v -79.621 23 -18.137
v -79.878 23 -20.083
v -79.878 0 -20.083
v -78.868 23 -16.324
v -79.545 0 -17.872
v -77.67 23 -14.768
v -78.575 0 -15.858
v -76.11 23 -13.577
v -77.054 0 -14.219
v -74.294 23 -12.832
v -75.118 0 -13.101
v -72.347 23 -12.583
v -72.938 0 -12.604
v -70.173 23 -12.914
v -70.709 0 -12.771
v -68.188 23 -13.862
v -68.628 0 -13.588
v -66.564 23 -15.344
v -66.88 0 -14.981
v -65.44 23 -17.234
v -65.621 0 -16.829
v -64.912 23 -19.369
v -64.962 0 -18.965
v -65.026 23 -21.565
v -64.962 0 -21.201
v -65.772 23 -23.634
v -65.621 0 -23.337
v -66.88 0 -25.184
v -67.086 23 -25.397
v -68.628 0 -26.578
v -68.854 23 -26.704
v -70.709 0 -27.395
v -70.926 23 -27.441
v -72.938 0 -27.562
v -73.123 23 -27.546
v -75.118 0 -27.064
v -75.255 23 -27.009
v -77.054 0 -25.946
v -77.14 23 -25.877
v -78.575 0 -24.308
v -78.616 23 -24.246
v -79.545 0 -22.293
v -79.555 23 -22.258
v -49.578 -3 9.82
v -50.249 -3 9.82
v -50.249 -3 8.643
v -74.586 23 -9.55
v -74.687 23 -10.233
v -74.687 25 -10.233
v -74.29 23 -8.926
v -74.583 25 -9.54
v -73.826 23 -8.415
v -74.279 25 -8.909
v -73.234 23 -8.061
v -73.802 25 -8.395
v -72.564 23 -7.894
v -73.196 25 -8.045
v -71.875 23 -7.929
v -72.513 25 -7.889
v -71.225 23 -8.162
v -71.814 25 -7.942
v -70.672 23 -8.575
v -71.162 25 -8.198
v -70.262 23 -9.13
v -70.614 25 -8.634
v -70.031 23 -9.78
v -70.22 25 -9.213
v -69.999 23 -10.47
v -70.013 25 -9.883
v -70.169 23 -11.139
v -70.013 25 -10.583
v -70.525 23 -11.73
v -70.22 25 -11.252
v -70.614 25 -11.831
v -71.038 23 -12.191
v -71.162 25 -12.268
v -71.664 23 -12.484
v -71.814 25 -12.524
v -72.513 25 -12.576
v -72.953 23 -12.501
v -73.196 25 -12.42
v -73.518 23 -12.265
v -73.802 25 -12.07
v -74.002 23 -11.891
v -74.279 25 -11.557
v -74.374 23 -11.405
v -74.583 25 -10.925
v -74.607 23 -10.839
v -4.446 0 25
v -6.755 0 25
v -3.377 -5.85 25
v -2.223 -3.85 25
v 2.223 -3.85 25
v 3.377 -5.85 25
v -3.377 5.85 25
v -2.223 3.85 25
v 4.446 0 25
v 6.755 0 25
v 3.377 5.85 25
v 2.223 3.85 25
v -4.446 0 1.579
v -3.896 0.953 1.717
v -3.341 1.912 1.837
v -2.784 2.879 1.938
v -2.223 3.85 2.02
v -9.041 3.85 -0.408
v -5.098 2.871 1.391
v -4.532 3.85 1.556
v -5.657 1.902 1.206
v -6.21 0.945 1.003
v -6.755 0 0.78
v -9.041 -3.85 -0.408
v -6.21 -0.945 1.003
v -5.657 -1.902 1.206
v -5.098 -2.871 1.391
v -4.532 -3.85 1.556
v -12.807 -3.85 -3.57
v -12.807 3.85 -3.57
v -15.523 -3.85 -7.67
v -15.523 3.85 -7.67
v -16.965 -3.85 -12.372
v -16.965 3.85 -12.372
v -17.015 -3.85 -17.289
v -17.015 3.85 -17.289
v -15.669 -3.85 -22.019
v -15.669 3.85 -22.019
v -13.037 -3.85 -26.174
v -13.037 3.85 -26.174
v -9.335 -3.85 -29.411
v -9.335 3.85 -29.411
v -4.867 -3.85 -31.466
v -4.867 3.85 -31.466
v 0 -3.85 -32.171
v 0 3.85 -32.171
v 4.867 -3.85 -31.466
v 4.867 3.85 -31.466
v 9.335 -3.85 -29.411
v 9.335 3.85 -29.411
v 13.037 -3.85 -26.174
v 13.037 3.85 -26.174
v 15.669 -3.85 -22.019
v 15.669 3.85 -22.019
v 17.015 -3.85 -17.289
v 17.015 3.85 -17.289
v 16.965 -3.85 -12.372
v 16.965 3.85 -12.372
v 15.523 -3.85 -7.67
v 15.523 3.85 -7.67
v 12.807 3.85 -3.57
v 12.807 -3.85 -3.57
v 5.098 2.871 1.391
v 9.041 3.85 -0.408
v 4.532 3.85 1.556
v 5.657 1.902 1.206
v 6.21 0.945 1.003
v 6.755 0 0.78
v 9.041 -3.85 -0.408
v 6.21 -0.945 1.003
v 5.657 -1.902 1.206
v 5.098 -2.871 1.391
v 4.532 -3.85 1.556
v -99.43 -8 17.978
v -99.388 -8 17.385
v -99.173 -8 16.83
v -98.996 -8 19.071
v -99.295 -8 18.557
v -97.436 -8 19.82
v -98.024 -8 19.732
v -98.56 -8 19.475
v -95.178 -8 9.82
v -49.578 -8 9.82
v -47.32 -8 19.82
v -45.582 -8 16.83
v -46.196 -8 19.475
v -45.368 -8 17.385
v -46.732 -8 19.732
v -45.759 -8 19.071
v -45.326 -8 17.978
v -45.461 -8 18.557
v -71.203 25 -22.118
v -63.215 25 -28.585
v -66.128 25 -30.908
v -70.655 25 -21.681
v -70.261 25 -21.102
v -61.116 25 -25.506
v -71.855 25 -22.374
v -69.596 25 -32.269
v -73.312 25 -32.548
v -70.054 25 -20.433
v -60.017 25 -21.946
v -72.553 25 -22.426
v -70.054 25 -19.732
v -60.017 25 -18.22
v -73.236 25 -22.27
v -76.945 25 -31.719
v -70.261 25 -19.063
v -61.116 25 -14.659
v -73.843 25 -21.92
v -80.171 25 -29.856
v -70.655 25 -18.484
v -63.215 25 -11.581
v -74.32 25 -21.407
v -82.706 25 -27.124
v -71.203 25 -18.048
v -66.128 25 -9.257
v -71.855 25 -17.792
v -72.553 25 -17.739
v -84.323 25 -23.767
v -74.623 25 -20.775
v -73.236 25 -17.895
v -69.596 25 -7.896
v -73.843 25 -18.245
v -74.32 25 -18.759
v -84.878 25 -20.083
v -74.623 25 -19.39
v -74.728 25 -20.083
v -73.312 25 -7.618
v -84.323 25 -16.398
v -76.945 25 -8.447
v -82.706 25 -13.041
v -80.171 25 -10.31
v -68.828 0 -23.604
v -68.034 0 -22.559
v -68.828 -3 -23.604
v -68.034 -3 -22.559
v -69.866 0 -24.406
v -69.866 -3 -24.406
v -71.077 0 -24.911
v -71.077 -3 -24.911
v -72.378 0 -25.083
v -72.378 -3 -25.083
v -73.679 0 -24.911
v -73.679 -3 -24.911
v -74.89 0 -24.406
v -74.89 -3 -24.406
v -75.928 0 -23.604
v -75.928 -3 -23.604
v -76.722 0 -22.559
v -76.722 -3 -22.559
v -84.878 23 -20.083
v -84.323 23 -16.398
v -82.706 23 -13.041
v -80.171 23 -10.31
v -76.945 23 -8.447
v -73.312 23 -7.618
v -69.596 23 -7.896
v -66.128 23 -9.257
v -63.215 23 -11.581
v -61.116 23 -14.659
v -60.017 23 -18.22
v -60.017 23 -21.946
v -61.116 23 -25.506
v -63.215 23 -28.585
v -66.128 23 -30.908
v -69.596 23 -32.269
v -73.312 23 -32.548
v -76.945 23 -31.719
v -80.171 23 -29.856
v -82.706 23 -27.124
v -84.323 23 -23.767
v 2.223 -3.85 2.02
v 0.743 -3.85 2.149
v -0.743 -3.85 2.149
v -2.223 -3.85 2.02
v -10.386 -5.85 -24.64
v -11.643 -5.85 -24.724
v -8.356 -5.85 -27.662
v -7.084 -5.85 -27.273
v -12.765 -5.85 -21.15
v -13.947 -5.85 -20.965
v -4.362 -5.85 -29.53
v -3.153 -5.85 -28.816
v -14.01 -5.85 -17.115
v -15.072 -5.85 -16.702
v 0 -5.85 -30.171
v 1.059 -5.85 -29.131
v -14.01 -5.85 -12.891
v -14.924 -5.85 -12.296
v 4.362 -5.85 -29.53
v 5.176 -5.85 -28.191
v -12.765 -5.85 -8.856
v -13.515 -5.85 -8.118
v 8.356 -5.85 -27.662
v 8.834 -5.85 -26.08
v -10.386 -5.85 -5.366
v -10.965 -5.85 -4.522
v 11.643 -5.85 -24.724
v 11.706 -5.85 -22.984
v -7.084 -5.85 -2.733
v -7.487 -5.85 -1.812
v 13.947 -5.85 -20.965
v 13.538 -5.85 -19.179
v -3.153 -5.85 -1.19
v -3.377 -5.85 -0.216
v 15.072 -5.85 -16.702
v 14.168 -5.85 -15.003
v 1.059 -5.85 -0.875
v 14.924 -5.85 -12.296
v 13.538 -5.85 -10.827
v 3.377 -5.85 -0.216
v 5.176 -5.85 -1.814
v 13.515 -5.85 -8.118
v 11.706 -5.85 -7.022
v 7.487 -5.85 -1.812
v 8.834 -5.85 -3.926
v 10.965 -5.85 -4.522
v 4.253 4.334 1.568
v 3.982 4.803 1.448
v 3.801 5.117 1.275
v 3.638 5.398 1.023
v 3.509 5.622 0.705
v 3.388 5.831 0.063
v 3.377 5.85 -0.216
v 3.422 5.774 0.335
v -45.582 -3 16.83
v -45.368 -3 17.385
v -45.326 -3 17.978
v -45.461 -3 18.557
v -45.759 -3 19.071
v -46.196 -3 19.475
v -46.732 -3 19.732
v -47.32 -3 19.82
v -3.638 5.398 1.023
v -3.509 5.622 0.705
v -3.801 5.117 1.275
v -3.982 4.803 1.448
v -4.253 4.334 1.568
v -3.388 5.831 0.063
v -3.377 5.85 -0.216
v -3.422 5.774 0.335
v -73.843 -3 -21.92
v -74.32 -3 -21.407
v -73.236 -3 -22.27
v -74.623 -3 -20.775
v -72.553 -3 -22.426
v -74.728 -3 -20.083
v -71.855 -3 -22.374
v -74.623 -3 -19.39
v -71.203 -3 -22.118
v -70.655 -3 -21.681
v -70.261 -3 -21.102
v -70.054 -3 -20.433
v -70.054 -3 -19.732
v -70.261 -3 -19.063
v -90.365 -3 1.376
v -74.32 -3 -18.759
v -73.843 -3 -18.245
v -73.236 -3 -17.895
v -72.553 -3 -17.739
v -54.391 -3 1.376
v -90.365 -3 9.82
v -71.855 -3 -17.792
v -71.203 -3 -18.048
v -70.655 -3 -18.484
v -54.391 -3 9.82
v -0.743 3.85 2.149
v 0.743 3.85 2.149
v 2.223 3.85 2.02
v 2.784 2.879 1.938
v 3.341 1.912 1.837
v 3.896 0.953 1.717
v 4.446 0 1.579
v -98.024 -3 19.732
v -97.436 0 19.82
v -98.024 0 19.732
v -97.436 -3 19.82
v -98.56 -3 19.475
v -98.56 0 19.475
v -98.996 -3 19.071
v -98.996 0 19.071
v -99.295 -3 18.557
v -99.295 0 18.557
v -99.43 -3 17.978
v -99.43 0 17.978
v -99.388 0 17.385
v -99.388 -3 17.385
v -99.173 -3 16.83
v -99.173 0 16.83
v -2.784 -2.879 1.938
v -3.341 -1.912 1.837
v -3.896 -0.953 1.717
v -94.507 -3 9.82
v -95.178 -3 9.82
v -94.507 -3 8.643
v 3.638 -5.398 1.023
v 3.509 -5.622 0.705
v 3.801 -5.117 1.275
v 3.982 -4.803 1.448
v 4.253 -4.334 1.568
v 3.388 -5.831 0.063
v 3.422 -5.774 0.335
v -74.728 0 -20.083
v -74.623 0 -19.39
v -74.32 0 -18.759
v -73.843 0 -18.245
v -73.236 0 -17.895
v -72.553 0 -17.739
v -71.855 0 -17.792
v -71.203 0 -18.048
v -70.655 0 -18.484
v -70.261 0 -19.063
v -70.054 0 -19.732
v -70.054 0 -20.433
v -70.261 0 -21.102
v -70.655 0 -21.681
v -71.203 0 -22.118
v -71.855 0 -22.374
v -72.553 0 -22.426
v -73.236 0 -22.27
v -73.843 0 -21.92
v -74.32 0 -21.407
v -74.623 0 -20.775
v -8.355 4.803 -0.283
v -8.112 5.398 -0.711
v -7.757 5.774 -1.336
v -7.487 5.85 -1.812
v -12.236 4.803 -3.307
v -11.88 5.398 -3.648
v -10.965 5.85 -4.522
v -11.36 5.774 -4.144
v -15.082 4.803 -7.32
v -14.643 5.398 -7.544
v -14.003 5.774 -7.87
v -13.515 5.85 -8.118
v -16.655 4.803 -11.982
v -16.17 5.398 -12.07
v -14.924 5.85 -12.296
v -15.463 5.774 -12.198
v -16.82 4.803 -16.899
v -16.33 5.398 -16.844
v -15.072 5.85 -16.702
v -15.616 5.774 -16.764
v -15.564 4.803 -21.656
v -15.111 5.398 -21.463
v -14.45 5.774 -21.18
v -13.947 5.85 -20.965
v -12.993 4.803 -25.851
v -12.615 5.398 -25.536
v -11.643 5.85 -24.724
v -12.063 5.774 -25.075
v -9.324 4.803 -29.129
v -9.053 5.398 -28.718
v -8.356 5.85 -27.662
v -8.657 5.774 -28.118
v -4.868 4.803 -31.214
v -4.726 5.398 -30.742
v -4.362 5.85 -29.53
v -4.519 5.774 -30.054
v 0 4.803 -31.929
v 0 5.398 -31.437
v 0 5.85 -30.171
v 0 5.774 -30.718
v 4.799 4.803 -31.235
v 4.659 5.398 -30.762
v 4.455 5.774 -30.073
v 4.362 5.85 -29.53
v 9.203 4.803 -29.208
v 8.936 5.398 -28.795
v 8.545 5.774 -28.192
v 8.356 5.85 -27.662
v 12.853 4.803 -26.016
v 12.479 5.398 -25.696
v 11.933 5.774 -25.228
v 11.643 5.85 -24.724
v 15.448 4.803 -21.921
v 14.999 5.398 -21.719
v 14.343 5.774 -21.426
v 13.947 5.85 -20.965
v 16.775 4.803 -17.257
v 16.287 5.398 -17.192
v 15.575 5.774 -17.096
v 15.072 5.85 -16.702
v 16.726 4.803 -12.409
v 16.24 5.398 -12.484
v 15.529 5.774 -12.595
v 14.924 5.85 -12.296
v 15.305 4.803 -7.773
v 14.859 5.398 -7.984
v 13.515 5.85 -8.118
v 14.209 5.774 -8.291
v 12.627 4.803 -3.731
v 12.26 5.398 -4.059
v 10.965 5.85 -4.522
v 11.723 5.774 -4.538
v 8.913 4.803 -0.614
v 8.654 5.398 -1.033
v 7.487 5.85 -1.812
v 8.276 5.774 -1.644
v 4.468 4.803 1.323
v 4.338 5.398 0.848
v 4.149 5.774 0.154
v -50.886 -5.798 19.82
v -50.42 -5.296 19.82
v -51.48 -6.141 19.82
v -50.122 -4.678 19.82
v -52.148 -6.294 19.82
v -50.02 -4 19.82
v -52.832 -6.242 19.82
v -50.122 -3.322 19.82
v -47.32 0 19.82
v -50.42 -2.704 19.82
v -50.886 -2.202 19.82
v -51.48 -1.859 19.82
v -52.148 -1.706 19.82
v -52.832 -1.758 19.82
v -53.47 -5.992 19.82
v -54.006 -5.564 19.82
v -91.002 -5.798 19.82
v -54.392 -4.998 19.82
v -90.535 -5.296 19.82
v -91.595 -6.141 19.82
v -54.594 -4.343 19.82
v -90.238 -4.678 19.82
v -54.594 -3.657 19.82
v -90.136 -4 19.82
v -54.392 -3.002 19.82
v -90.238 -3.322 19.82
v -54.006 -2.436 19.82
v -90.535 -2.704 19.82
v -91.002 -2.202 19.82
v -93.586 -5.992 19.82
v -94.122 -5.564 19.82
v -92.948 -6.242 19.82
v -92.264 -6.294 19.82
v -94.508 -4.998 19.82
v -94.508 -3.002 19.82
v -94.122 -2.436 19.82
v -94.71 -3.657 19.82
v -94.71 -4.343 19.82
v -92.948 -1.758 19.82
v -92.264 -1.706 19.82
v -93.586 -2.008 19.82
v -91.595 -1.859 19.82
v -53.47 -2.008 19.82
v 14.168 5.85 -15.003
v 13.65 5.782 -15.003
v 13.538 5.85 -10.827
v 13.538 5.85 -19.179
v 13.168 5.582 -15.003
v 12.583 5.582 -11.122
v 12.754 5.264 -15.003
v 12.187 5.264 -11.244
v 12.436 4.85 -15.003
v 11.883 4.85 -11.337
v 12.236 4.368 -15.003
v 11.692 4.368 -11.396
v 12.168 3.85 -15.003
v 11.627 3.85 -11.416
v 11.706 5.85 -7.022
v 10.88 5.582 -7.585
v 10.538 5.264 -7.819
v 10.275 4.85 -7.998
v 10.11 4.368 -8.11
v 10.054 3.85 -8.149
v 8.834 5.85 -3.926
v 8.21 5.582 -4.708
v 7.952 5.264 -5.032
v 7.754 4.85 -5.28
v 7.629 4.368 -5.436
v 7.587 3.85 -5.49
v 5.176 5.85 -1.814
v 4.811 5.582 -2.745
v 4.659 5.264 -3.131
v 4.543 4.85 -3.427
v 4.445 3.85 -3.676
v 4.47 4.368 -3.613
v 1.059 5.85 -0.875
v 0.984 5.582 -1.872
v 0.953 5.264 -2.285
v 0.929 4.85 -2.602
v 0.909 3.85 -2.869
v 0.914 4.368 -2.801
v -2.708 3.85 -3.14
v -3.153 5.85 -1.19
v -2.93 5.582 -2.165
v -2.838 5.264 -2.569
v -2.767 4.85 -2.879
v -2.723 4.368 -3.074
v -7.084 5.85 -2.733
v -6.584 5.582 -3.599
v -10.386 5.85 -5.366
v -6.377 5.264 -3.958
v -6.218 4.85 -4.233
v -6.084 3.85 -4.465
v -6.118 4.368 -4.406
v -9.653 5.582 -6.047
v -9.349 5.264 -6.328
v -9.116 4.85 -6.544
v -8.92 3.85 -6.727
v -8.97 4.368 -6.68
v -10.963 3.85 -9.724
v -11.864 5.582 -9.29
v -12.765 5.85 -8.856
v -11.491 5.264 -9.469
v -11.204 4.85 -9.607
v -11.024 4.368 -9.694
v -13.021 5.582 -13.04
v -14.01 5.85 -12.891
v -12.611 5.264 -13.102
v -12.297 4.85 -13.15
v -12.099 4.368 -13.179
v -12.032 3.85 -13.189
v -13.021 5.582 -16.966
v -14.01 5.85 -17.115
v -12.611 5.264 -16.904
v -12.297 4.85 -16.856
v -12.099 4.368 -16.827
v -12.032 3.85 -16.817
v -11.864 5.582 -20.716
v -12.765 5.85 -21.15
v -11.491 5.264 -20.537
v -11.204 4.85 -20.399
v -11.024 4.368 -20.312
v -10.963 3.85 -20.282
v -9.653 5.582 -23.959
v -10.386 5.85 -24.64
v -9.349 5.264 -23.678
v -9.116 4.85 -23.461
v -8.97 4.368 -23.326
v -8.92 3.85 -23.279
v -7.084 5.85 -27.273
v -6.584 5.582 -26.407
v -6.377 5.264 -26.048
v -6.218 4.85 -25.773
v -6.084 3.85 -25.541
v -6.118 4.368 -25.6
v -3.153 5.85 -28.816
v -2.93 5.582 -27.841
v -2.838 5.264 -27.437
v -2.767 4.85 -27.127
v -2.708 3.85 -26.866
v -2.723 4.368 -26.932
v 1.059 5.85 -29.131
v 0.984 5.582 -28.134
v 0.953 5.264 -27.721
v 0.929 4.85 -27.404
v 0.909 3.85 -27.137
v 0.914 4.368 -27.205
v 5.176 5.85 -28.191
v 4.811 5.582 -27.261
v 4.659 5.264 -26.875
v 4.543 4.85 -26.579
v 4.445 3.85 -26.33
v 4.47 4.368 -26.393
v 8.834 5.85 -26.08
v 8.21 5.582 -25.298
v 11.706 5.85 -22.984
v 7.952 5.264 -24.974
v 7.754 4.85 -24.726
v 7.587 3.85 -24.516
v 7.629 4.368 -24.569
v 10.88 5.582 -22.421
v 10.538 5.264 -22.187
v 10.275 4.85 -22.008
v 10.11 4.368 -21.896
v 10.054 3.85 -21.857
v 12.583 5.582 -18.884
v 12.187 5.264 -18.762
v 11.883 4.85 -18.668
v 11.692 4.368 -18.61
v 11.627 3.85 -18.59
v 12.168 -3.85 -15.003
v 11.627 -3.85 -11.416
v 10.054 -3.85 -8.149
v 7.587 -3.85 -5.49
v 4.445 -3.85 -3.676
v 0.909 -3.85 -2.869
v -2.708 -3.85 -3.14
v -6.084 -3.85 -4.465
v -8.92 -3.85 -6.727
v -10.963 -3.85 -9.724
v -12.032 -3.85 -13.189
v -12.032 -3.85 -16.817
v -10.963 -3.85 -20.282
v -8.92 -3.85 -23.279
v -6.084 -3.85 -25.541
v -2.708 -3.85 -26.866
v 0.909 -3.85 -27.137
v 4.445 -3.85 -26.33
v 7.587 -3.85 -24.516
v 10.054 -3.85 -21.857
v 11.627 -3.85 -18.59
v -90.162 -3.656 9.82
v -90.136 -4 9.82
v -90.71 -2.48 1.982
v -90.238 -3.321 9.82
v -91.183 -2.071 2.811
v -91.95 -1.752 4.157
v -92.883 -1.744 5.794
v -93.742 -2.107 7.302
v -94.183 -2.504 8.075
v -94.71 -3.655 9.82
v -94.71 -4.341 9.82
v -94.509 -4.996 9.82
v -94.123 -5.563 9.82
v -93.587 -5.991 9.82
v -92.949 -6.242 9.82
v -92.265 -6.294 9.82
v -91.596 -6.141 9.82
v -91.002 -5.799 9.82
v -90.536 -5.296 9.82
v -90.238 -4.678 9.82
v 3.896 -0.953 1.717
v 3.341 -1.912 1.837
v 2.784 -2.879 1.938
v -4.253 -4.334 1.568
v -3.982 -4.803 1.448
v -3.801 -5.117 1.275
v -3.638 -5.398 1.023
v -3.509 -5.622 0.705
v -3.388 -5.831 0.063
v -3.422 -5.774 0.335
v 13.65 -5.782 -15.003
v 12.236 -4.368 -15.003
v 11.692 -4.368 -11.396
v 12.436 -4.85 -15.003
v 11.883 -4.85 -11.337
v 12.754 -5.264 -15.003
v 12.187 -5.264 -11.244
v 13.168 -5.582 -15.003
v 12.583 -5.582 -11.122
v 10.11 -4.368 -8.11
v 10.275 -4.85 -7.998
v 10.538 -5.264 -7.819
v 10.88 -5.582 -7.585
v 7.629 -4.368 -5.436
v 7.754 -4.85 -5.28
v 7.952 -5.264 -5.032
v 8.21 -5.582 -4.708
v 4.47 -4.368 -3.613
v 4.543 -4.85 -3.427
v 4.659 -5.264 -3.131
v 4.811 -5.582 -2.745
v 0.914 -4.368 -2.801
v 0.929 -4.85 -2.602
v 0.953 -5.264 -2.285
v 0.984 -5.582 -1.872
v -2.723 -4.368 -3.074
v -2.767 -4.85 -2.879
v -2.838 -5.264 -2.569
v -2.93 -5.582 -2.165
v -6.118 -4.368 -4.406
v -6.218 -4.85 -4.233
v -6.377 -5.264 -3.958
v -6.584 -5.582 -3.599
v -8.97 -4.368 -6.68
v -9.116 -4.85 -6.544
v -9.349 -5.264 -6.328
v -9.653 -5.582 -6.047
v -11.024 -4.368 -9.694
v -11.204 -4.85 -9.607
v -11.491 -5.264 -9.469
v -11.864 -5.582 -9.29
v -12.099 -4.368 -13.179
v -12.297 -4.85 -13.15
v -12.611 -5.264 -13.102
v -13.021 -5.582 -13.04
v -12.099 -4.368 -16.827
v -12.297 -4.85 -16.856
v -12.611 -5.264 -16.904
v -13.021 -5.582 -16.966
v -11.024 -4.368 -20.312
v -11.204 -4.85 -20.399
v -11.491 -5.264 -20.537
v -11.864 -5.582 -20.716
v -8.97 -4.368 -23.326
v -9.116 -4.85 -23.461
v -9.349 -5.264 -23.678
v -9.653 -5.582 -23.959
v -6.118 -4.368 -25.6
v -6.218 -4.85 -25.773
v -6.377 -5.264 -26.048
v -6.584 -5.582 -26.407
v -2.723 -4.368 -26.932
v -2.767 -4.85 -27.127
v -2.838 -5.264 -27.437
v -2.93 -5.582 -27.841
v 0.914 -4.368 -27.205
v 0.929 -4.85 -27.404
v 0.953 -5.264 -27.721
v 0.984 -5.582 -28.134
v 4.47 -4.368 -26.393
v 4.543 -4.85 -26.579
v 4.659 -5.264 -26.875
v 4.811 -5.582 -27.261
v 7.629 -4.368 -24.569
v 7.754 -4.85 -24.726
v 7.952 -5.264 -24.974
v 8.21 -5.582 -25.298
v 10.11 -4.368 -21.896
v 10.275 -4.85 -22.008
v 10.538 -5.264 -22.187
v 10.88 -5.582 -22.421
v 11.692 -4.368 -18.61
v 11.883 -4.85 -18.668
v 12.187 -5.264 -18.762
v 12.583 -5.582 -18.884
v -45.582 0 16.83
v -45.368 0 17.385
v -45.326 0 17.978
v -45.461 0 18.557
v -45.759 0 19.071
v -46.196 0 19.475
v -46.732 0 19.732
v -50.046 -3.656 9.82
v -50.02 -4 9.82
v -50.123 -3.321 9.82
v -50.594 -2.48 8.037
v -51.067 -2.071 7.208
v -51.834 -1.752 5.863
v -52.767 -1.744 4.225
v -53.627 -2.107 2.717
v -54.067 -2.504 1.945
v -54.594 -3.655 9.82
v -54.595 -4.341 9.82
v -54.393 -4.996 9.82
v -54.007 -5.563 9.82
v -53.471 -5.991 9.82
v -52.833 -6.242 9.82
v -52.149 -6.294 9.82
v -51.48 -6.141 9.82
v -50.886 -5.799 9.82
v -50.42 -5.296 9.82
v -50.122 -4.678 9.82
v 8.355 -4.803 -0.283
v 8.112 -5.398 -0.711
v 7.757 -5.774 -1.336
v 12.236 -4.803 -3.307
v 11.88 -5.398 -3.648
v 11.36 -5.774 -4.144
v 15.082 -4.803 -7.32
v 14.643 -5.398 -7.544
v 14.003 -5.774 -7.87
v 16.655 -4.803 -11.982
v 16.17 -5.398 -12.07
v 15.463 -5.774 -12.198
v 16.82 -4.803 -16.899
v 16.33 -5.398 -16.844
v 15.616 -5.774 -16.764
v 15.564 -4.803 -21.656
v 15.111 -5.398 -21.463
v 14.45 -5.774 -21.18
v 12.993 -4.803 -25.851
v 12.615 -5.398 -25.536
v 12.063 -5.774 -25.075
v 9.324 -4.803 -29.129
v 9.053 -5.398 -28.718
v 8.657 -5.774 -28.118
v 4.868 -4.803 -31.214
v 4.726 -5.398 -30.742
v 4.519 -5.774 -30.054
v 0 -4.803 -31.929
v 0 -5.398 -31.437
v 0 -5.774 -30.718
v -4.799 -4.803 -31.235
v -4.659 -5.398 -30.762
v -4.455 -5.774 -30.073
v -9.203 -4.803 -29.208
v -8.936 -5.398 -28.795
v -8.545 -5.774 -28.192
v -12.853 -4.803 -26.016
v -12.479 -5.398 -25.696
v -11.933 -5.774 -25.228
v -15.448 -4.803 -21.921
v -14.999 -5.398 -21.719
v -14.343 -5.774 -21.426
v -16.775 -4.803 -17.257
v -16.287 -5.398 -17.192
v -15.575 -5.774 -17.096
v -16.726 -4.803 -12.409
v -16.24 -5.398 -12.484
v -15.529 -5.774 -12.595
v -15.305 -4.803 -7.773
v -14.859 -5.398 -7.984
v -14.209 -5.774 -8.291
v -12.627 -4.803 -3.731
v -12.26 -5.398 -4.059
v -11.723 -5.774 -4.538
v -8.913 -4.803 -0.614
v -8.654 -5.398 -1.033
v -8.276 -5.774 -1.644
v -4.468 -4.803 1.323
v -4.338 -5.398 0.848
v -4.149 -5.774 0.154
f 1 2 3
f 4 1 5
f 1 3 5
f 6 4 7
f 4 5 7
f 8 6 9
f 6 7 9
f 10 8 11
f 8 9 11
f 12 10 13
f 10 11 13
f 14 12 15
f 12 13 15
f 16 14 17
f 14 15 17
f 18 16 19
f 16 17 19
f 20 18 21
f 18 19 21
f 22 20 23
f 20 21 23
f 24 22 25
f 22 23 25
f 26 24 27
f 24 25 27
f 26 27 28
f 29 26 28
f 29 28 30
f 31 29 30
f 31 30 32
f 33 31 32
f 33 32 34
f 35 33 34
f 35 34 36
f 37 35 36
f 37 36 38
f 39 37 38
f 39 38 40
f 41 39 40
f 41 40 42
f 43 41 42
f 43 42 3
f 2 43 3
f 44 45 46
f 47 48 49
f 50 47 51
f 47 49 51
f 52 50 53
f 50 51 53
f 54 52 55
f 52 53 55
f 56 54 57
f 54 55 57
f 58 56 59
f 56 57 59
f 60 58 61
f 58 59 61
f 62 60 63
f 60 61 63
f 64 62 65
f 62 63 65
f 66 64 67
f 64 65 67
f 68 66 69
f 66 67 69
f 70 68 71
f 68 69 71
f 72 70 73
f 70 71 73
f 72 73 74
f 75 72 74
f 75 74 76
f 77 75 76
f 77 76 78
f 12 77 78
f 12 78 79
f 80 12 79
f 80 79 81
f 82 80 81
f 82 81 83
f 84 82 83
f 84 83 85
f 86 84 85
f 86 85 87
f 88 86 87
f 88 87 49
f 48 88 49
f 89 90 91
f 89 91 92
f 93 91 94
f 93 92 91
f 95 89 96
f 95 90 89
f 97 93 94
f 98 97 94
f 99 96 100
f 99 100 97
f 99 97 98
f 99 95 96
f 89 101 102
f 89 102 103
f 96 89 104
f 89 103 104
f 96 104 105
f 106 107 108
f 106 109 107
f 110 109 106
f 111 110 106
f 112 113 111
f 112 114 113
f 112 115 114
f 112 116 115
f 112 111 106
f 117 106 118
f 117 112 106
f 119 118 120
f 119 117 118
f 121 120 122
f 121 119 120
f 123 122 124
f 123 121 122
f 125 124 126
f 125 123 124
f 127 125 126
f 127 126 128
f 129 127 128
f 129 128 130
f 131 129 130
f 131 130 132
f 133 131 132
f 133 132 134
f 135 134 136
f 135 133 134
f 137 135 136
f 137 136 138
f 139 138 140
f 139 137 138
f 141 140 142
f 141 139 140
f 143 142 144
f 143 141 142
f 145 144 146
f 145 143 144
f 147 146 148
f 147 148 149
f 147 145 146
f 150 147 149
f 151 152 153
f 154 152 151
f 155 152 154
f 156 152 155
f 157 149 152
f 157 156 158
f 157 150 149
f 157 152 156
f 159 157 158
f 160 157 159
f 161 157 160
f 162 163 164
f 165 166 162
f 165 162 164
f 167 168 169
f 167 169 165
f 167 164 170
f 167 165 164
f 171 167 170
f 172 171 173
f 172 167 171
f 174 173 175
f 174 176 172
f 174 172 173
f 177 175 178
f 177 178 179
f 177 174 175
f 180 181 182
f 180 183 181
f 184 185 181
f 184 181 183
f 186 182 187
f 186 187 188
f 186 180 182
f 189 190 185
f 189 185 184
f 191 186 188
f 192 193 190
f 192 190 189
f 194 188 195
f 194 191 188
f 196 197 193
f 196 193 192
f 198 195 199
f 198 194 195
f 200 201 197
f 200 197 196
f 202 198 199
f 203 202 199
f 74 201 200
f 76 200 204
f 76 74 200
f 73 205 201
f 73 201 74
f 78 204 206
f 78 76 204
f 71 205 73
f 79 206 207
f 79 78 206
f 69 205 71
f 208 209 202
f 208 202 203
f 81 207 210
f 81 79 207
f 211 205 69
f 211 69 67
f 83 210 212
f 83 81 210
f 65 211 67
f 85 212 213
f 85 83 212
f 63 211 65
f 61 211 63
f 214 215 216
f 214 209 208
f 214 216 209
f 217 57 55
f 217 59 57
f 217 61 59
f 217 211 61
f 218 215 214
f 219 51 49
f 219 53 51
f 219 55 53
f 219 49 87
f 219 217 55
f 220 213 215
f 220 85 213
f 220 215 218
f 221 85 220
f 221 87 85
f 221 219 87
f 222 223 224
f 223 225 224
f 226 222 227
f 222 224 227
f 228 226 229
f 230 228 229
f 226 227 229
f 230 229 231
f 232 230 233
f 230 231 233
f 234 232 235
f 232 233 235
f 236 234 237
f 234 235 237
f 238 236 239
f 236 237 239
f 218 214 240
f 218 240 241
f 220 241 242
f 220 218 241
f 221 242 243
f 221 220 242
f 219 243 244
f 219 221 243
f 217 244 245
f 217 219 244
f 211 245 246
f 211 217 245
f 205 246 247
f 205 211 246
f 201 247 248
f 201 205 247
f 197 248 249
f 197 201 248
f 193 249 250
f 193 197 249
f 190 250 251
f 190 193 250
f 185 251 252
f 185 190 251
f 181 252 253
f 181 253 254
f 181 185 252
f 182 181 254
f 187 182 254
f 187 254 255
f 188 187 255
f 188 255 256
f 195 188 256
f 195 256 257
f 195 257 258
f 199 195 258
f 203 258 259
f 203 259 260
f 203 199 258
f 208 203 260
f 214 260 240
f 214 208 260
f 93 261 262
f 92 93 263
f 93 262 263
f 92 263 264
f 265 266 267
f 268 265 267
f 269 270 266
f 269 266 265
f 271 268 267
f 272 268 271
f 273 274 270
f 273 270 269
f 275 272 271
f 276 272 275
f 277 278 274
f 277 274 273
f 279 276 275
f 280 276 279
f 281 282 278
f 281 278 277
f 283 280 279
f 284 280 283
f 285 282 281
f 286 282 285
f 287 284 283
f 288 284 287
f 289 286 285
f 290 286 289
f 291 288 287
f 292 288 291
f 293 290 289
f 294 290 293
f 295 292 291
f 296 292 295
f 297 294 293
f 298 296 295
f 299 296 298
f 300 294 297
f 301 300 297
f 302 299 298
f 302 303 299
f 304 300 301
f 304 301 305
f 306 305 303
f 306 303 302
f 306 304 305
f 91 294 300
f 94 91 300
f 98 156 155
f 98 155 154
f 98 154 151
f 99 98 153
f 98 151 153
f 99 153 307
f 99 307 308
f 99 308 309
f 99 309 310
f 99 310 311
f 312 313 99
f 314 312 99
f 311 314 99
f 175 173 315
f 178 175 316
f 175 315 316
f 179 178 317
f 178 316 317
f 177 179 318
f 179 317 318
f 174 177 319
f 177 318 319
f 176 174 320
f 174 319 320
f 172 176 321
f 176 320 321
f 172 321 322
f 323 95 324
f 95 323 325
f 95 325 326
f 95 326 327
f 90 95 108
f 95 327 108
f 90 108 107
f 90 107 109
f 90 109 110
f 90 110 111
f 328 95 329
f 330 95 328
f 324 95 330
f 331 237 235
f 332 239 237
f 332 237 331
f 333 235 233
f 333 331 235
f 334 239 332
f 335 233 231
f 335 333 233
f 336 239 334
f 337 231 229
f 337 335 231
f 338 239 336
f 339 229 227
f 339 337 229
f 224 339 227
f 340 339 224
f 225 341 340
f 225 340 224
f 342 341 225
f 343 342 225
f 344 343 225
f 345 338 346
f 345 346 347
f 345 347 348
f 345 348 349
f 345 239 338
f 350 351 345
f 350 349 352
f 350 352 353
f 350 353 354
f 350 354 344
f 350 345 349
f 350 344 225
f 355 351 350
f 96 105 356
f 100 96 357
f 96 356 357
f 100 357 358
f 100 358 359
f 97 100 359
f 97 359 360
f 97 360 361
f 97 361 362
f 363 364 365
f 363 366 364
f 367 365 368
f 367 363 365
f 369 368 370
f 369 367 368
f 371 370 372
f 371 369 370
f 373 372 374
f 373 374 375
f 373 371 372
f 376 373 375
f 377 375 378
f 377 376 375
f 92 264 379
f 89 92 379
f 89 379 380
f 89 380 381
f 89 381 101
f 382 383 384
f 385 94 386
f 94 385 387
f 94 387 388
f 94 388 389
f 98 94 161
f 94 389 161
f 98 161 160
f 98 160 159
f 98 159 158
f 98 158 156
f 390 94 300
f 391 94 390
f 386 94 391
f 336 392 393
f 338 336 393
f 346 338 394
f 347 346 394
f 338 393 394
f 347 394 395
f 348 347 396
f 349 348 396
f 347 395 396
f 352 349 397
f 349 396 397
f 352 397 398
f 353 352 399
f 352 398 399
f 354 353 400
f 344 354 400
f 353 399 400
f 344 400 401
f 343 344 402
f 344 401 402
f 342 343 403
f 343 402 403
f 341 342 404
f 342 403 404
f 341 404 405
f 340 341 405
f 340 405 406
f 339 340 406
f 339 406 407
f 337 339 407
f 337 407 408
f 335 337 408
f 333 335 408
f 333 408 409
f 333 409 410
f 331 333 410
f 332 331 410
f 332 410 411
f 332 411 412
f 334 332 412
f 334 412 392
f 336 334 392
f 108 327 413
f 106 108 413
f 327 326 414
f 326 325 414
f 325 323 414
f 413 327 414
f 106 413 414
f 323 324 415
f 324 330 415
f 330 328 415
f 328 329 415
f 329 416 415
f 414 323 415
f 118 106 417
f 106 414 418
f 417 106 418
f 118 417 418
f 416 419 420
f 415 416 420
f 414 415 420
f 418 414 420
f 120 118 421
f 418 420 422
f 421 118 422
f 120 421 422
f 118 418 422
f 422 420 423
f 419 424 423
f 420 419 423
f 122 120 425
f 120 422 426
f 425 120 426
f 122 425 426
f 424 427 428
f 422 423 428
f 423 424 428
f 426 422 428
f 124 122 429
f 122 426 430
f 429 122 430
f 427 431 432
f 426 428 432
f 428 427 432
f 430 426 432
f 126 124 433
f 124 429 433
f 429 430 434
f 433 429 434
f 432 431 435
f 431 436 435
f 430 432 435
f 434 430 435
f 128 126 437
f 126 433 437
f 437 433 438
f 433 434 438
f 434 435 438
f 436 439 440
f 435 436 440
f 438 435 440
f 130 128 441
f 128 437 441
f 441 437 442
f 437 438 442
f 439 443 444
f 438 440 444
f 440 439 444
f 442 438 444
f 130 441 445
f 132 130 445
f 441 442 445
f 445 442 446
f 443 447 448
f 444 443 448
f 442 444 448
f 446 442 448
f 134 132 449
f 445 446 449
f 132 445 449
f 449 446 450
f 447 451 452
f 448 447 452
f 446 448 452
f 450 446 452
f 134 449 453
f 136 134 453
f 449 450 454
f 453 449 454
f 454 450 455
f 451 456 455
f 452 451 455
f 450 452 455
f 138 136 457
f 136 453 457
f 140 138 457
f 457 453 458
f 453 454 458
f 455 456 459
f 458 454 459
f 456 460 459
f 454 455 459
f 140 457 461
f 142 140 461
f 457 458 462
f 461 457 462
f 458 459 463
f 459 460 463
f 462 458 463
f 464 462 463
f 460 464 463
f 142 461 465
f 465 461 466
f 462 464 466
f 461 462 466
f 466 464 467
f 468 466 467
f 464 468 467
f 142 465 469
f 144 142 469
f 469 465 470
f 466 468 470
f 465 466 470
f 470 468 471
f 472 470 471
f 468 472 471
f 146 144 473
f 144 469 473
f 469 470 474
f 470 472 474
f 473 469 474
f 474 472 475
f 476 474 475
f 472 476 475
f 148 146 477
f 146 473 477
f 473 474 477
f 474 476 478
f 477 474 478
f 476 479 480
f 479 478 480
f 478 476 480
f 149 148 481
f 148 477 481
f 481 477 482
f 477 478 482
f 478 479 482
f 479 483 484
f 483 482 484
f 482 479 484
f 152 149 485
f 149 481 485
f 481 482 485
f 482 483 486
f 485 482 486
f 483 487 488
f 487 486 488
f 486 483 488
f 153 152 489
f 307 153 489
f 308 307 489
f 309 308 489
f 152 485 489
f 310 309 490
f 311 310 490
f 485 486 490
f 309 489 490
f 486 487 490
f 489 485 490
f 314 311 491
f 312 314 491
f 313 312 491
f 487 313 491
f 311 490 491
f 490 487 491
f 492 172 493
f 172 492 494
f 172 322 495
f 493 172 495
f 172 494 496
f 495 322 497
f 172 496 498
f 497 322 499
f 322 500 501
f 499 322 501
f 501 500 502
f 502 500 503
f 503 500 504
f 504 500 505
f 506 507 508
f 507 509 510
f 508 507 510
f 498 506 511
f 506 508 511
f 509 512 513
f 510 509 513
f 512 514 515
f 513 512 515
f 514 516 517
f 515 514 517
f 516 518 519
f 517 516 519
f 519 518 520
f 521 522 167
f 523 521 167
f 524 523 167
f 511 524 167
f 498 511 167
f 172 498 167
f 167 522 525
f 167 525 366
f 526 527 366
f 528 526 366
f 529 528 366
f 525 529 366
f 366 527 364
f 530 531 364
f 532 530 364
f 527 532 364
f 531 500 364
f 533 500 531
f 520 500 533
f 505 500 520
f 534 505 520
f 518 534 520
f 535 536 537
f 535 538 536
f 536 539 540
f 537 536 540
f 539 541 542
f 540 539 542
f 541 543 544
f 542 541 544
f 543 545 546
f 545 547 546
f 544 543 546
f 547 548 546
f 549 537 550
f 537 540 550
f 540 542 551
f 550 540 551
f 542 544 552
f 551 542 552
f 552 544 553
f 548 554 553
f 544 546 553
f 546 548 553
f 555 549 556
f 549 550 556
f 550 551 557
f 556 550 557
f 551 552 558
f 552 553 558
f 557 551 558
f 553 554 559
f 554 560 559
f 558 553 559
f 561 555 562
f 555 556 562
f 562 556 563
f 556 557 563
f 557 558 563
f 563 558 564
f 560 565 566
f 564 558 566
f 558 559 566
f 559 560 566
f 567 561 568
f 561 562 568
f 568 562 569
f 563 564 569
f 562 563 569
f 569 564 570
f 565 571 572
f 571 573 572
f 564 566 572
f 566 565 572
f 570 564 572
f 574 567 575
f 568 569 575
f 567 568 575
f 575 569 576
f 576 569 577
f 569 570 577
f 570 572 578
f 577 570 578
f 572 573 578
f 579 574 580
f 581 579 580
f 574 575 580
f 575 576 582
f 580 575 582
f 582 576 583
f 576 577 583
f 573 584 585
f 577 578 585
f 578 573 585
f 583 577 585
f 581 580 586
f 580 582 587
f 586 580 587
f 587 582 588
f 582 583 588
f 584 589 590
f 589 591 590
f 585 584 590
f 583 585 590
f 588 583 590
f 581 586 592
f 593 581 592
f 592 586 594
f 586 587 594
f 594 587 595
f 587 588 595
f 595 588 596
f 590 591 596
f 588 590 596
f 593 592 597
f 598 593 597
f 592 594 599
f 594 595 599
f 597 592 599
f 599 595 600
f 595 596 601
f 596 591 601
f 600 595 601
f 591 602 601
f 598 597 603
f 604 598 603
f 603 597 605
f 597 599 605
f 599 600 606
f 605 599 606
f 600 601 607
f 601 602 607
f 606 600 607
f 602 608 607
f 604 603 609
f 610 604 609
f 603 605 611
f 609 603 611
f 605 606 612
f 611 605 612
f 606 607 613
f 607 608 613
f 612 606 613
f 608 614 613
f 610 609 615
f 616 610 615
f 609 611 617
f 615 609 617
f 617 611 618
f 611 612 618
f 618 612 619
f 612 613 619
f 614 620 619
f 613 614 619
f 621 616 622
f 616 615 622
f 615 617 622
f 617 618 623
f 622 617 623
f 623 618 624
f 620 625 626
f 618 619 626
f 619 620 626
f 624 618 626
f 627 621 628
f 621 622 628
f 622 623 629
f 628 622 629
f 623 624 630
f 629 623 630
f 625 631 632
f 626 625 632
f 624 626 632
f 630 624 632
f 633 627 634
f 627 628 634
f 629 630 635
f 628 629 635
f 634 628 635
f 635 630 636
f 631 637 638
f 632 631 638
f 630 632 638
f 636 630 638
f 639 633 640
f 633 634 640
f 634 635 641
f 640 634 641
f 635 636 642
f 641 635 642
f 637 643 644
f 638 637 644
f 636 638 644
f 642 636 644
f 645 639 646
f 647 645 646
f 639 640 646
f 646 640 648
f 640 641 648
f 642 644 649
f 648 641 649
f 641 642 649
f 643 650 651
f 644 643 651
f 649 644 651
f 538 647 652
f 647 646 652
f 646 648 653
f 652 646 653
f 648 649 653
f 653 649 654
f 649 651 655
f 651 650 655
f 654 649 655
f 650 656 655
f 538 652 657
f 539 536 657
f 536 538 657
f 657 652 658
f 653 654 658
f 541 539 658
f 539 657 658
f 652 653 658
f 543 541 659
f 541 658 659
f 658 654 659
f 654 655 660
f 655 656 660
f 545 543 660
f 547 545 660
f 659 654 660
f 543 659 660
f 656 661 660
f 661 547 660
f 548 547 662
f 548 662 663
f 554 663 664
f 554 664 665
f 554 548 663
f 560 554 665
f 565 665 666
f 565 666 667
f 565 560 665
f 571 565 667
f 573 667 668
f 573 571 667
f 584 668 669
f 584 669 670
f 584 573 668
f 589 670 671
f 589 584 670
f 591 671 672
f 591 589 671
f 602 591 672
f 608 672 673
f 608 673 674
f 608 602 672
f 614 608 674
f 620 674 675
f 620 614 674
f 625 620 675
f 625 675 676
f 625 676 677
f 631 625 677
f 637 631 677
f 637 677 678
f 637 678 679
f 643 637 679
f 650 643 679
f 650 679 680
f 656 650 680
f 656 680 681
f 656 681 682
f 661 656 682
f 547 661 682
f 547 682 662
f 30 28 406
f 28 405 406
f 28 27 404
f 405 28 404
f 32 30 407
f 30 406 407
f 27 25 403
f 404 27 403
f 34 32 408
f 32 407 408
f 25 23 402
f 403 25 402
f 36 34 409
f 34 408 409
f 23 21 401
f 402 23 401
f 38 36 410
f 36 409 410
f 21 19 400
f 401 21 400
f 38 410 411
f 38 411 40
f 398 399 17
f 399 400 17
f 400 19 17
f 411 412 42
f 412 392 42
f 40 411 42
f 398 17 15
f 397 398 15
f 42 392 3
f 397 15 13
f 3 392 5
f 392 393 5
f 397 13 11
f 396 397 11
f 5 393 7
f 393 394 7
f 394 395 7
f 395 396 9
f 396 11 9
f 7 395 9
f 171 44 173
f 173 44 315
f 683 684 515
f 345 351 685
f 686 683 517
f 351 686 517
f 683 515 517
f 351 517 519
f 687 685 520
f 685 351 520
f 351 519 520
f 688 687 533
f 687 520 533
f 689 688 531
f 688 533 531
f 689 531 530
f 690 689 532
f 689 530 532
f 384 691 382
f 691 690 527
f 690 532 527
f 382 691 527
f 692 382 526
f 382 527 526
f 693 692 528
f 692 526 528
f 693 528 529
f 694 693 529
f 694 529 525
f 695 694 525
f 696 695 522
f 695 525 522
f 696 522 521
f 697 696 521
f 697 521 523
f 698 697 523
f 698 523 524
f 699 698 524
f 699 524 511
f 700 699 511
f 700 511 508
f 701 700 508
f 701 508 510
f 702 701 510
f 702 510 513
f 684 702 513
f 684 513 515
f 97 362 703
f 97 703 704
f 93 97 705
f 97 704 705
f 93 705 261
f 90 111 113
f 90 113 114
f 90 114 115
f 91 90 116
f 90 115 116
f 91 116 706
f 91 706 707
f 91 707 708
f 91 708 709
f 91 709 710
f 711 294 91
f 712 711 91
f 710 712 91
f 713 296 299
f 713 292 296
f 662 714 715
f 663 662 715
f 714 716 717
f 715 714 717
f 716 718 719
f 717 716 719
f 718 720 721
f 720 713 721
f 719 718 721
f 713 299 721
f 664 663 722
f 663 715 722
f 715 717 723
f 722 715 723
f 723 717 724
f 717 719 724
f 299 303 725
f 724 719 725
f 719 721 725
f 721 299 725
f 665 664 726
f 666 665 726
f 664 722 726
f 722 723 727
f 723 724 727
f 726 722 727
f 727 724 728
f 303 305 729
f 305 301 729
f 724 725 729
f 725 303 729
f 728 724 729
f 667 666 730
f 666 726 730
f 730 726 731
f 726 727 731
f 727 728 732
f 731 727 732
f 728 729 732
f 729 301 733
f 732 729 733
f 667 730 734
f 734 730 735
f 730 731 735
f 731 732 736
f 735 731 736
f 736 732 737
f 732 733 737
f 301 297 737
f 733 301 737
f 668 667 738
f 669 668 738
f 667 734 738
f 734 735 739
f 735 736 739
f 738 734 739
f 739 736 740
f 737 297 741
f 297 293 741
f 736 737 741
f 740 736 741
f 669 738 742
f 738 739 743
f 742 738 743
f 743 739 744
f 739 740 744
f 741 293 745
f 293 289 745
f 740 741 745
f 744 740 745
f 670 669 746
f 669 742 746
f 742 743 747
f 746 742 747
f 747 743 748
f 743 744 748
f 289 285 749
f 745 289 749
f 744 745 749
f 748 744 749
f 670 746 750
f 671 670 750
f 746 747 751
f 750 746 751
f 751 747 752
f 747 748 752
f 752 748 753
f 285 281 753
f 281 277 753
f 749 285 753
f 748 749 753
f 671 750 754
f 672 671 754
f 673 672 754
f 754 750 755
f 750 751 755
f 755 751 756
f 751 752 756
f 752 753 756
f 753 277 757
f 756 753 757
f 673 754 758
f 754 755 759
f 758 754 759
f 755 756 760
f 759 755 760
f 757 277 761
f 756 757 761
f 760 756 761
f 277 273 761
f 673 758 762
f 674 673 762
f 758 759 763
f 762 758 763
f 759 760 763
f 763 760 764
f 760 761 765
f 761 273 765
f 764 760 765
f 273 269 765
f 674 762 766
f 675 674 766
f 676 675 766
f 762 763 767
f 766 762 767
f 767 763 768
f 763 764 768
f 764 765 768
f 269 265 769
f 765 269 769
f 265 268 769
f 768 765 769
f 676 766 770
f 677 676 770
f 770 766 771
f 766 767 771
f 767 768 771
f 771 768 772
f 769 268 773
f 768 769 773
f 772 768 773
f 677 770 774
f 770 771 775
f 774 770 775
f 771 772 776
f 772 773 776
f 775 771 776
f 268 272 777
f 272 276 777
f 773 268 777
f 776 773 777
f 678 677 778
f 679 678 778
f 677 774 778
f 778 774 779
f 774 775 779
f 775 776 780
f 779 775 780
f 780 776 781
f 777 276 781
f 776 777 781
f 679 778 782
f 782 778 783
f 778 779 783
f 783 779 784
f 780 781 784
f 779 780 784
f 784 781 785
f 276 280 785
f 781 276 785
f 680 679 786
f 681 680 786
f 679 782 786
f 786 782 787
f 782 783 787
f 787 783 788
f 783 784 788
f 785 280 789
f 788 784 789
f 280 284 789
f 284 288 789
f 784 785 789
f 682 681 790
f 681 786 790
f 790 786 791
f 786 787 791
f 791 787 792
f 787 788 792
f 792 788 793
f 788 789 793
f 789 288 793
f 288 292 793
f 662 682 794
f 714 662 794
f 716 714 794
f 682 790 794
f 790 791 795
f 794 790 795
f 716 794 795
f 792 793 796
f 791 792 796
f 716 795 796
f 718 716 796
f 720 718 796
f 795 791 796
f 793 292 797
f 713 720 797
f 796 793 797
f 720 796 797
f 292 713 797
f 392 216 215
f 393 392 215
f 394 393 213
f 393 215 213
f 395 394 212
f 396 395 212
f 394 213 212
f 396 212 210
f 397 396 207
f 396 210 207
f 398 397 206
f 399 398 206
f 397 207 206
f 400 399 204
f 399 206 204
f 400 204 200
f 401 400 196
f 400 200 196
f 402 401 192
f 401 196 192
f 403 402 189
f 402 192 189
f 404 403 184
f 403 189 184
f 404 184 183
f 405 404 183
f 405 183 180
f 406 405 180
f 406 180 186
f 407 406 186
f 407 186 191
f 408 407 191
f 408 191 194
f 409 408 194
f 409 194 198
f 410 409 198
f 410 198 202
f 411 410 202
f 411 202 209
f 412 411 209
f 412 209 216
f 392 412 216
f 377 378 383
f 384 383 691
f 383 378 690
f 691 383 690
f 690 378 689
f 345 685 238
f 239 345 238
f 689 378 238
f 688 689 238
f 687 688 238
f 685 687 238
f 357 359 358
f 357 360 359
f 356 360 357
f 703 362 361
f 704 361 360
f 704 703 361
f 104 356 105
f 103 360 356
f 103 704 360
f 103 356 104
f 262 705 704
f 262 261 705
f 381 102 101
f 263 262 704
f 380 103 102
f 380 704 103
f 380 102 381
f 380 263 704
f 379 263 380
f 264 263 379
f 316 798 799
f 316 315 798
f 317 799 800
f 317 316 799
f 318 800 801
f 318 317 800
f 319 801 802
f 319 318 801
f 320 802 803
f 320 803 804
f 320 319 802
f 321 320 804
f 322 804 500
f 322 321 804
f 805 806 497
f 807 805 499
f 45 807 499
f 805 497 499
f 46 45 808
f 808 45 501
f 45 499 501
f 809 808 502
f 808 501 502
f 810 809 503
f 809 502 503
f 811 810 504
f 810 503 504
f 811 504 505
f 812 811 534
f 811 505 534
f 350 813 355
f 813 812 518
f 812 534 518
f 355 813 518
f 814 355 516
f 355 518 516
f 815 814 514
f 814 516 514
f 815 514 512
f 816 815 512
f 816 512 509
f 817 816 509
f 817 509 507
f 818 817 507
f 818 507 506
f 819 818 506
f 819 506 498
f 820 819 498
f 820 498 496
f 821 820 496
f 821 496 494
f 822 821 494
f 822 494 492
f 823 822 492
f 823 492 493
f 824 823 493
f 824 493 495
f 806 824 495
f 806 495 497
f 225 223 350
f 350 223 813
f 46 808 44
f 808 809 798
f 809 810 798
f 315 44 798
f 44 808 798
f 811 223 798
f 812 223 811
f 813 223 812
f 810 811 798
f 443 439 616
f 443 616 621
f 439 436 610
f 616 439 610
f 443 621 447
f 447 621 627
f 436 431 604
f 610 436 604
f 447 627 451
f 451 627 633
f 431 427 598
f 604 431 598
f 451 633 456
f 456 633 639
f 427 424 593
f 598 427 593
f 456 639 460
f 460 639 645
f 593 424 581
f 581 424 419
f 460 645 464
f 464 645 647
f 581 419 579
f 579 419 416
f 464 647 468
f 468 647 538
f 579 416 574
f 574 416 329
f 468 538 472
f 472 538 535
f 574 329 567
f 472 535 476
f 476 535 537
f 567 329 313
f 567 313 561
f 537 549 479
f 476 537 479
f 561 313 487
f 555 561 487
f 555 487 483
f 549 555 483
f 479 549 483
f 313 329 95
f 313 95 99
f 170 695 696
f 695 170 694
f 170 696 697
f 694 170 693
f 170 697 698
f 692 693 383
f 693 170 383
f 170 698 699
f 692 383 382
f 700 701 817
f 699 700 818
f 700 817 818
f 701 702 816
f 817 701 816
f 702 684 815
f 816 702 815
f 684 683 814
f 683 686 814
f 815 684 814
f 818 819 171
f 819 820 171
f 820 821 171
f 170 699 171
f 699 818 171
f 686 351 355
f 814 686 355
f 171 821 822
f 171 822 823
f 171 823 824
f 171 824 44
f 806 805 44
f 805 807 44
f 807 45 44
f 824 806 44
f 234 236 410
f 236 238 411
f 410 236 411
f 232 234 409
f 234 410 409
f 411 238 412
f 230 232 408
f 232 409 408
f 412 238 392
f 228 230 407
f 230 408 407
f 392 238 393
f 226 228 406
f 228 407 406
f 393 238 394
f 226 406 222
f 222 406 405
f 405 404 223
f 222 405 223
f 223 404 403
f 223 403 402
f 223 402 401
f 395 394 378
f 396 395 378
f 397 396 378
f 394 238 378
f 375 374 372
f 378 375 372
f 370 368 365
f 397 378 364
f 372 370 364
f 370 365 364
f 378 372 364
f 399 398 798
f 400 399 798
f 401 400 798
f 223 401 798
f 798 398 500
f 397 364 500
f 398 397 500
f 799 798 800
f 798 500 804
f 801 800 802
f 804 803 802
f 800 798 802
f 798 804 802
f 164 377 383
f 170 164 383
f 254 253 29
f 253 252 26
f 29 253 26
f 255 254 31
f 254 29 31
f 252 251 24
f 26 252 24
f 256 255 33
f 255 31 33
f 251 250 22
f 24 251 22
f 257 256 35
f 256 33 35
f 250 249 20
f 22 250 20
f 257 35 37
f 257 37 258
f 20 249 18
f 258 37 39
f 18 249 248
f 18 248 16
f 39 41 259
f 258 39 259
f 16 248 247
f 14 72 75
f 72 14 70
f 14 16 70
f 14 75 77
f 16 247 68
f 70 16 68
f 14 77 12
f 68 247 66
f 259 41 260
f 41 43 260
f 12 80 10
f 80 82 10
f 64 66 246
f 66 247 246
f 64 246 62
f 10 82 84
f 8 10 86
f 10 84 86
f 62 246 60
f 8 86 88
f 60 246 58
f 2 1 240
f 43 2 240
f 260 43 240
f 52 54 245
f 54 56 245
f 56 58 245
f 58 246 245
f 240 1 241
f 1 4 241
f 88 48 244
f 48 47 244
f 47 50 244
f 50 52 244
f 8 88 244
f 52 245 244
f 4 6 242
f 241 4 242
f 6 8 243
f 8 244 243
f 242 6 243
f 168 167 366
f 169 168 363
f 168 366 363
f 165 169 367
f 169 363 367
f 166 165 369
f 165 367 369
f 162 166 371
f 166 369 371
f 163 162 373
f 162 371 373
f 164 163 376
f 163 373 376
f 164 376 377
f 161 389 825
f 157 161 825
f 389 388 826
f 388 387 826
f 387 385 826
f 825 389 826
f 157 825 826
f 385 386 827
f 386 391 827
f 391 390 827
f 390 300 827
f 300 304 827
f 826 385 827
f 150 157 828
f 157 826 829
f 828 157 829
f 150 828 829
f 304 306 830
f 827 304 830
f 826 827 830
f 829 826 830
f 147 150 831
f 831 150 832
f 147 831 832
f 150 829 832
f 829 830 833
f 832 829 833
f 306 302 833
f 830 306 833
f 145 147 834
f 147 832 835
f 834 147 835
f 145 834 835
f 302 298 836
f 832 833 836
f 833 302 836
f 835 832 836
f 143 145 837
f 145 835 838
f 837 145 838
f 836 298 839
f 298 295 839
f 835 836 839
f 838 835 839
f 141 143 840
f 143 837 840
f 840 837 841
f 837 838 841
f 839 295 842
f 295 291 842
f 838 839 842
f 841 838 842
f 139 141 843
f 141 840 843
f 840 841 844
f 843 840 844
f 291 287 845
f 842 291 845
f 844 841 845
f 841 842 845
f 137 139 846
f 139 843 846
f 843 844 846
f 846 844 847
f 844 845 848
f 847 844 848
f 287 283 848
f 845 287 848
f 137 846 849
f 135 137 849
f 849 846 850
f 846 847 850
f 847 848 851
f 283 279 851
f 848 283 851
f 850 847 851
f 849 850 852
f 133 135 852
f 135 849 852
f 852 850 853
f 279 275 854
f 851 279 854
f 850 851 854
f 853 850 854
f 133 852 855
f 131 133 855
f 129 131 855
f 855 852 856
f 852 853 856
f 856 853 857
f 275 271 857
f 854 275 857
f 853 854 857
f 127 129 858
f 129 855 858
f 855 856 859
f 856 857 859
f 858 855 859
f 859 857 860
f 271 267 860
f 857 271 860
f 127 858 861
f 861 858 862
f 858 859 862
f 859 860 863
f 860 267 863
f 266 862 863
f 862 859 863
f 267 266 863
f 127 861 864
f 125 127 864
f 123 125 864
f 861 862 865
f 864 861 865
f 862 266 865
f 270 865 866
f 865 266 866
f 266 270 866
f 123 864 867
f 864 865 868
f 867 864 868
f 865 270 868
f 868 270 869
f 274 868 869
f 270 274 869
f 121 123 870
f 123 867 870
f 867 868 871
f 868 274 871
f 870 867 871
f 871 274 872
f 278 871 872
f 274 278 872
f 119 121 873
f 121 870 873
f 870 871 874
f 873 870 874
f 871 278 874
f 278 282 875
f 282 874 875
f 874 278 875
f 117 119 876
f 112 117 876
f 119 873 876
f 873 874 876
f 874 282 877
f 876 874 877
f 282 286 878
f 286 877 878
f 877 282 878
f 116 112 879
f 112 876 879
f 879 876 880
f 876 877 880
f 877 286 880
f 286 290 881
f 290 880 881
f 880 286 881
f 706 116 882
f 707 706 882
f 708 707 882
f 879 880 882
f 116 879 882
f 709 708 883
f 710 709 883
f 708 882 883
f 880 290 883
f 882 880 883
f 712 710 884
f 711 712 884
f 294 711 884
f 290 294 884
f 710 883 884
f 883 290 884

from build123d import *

# Parameters (mm, degrees)
F1_DEPTH  = 25
F2_R      = 17.1678772175
F2_R_2    = 12.1678772175
F3_DEPTH  = 5.85
F4_R      = 2
F6_DEPTH  = 3
F7_R      = 5
F8_R      = 2
F10_DEPTH = 5
F12_R     = 2.3
F13_DEPTH = 25
F14_R     = 2.35
F15_DEPTH = 8.001
F16_R     = 7.5
F17_DEPTH = 25
F18_R     = 12.5
F18_R_2   = 7.5
F19_DEPTH = 2
F20_R     = 2.35
F21_DEPTH = 33.001
F22_R     = 2.35
F23_DEPTH = 2


with BuildPart() as f1:
    # F0 (on Top) → F1 (new body)
    with BuildSketch(Plane.XY):
        Polygon((3.3774990748, 5.85), (-3.3774990748, 5.85), (-6.7549981495, 0), (-3.3774990748, -5.85), (3.3774990748, -5.85), (6.7549981495, 0), align=None)
        Polygon((-4.4455970728, 0), (-2.2227985364, 3.85), (2.2227985364, 3.85), (4.4455970728, 0), (2.2227985364, -3.85), (-2.2227985364, -3.85), align=None, mode=Mode.SUBTRACT)
    extrude(amount=F1_DEPTH)

    # F2 (on Front) → F3 (join, symmetric)
    with BuildSketch(Plane.XZ):
        with Locations((0, -15.0029723165)):
            Circle(F2_R)
        with Locations((0, -15.0029723165)):
            Circle(F2_R_2, mode=Mode.SUBTRACT)
    extrude(amount=F3_DEPTH, both=True)

    # F4
    f4_edges = [f1.edges().sort_by_distance(p)[0] for p in [
        (-12.167877, -5.85, -15.002972),
        (-12.167877, 5.85, -15.002972),
        (0, 5.85, -32.17085),
        (0, -5.85, -32.17085),
    ]]
    fillet(f4_edges, radius=F4_R)


with BuildPart() as f6:
    # F5 (on Front) → F6 (new body)
    with BuildSketch(Plane.XZ):
        Polygon((-72.377845645, -30.1795691463), (-43.877845645, 19.8204308537), (-100.877845645, 19.8204308537), align=None)
    extrude(amount=F6_DEPTH)

    # F7
    f7_edges = [f6.edges().sort_by_distance(p)[0] for p in [
        (-72.377846, -1.5, -30.179569),
    ]]
    fillet(f7_edges, radius=F7_R)

    # F8
    f8_edges = [f6.edges().sort_by_distance(p)[0] for p in [
        (-43.877846, -1.5, 19.820431),
        (-100.877846, -1.5, 19.820431),
    ]]
    fillet(f8_edges, radius=F8_R)

    # F9 (on face) → F10 (join)
    with BuildSketch(Plane.XZ.offset(3)):
        with BuildLine():
            ThreePointArc((-45.5823771151, 16.8300247656), (-45.5906525895, 18.8252163591), (-47.3199316555, 19.8204308537))
            Line((-47.3199316555, 19.8204308537), (-97.4357596344, 19.8204308537))
            ThreePointArc((-97.4357596344, 19.8204308537), (-99.1650387004, 18.8252163591), (-99.1733141748, 16.8300247656))
            Line((-99.1733141748, 16.8300247656), (-95.177845645, 9.8204308537))
            Line((-95.177845645, 9.8204308537), (-49.577845645, 9.8204308537))
            Line((-49.577845645, 9.8204308537), (-45.5823771151, 16.8300247656))
        make_face()
    extrude(amount=F10_DEPTH)

    # F12 (on face) → F13 (cut)
    with BuildSketch(Plane.XY.offset(19.8204308537)):
        with Locations((-92.4357596344, -4)):
            Circle(F12_R)
        with Locations((-52.3199316555, -4)):
            Circle(F12_R)
    extrude(amount=-F13_DEPTH, mode=Mode.SUBTRACT)

    # F14 (on face) → F15 (cut, through all)
    with BuildSketch(Plane(origin=(0, 0, 0), x_dir=(-1, 0, 0), z_dir=(0, 1, 0))):
        with Locations((72.377845645, -20.082700679)):
            Circle(F14_R)
    extrude(amount=-F15_DEPTH, mode=Mode.SUBTRACT)


with BuildPart() as f17:
    # F16 (on face) → F17 (new body)
    with BuildSketch(Plane(origin=(0, 0, 0), x_dir=(-1, 0, 0), z_dir=(0, 1, 0))):
        with Locations((72.377845645, -20.082700679)):
            Circle(F16_R)
    extrude(amount=F17_DEPTH)

    # F18 (on face) → F19 (join)
    with BuildSketch(Plane(origin=(0, 25, 0), x_dir=(-1, 0, 0), z_dir=(0, 1, 0))):
        with Locations((72.377845645, -20.082700679)):
            Circle(F18_R)
        with Locations((72.377845645, -20.082700679)):
            Circle(F18_R_2, mode=Mode.SUBTRACT)
    extrude(amount=-F19_DEPTH)

    # F20 (on face) → F21 (cut, through all)
    with BuildSketch(Plane(origin=(0, 25, 0), x_dir=(-1, 0, 0), z_dir=(0, 1, 0))):
        with Locations((72.377845645, -20.082700679)):
            Circle(F20_R)
    extrude(amount=-F21_DEPTH, mode=Mode.SUBTRACT)

    # F22 (on face) → F23 (cut, through all)
    with BuildSketch(Plane(origin=(0, 25, 0), x_dir=(-1, 0, 0), z_dir=(0, 1, 0))):
        with Locations((72.3369743648, -10.2327854743)):
            Circle(F22_R)
    extrude(amount=-F23_DEPTH, mode=Mode.SUBTRACT)


solid = Compound([f1.part, f6.part, f17.part])
